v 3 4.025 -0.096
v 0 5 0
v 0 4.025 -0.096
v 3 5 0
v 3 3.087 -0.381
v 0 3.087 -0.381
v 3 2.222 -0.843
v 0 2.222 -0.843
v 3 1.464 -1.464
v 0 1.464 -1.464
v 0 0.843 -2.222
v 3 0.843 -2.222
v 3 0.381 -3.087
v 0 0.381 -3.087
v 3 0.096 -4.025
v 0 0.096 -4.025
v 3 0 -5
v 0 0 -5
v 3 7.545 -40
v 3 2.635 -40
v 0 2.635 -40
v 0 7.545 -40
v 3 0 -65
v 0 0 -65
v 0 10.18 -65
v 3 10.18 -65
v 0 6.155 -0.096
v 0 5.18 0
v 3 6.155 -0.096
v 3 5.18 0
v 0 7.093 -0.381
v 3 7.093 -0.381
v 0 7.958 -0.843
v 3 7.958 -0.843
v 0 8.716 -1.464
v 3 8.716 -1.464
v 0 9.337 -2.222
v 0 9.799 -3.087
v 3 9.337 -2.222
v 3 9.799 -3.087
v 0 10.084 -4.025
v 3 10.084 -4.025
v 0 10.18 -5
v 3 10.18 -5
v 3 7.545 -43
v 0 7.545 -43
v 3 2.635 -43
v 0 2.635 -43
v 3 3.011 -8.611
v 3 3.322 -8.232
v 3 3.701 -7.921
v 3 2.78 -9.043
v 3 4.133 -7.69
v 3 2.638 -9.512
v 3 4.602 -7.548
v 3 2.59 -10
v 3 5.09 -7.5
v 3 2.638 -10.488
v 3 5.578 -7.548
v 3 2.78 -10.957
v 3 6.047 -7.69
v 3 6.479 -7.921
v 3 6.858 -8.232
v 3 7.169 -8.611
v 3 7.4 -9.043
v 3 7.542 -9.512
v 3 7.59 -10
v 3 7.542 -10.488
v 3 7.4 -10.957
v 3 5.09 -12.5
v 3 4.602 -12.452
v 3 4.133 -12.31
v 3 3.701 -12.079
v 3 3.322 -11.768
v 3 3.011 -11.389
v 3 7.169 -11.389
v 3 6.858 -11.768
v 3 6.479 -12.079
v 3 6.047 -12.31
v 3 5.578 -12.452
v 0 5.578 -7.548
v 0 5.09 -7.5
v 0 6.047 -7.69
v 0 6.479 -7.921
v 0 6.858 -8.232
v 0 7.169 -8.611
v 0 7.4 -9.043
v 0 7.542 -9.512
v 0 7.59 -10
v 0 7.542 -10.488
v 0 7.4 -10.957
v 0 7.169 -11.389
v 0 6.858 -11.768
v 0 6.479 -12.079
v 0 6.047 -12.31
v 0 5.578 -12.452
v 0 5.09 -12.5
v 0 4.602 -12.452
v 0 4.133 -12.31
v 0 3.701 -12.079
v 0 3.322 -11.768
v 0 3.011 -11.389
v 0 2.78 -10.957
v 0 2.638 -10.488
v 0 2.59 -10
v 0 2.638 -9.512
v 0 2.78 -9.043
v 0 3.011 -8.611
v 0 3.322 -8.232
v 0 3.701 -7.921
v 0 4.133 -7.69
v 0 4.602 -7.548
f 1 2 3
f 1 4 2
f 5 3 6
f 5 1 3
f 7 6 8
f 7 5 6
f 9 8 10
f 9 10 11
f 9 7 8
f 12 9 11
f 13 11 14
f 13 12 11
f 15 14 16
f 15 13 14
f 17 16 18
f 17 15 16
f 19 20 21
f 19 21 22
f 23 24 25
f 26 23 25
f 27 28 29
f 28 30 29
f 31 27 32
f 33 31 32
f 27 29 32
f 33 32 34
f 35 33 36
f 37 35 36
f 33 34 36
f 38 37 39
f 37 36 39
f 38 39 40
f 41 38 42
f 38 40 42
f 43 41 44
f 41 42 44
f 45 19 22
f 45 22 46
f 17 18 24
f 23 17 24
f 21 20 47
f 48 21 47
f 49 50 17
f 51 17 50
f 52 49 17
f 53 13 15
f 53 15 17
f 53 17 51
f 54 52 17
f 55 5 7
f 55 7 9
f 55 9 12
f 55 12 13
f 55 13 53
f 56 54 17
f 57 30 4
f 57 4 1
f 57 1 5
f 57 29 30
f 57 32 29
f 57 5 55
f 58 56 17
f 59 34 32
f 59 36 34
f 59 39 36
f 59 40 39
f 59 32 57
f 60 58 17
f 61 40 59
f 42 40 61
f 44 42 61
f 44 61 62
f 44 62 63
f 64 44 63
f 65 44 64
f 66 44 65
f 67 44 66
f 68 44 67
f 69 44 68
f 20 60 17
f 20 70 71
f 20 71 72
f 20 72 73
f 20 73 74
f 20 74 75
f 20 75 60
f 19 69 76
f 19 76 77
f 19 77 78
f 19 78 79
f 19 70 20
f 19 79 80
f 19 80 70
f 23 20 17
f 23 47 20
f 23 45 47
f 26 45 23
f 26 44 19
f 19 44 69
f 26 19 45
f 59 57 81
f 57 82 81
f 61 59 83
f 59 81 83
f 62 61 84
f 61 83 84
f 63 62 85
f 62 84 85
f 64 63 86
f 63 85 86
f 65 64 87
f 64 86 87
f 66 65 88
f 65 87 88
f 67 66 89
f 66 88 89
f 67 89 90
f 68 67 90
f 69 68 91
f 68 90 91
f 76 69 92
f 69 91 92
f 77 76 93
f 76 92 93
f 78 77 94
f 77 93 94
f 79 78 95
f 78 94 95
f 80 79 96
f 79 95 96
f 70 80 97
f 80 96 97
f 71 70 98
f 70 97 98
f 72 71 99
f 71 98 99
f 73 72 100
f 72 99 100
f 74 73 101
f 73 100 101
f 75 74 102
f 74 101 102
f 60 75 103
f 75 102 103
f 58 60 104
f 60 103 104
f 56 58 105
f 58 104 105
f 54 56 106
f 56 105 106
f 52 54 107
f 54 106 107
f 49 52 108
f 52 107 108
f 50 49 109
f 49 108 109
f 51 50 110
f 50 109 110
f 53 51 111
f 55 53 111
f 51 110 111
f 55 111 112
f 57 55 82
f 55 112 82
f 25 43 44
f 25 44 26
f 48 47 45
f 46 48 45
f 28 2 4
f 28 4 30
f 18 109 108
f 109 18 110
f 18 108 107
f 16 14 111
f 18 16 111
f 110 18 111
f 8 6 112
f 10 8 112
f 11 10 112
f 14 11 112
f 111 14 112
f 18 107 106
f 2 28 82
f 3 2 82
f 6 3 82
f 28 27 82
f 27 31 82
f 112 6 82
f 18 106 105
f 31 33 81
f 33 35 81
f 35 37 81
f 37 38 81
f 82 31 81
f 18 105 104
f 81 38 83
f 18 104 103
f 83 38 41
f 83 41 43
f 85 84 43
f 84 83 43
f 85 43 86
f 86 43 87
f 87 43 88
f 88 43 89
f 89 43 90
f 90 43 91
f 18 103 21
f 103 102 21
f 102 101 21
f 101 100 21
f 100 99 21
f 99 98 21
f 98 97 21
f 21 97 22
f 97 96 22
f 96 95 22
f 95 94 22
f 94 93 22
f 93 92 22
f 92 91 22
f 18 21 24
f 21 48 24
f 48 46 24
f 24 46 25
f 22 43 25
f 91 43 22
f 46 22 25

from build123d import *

# Parameters (mm, degrees)
SKETCH1_W                 = 65
SKETCH1_H                 = 10.18
BOSS_EXTRUDE1_DEPTH       = 3
F_5_0MM_DOWEL_HOLE1_D     = 5
F_5_0MM_DOWEL_HOLE1_DEPTH = 3
F_5_0MM_DOWEL_HOLE1_TIP   = 1.502151548
FILLET1_R                 = 5
SKETCH4_W                 = 3
SKETCH4_H                 = 4.91
CUT_EXTRUDE1_DEPTH        = 3


with BuildPart() as part:
    # Sketch1 → Boss-Extrude1 (new body)
    with BuildSketch(Plane(origin=(0, 0, 0), x_dir=(0, 0, -1), z_dir=(1, 0, 0))):
        with Locations((32.5, 5.09)):
            Rectangle(SKETCH1_W, SKETCH1_H)
    extrude(amount=BOSS_EXTRUDE1_DEPTH)

    # Ø5.0mm Dowel Hole1
    with Locations(Plane(origin=(3, 0, 0), x_dir=(0, 0, -1), z_dir=(1, 0, 0))):
        with Locations((10, 5.09)):
            Hole(F_5_0MM_DOWEL_HOLE1_D / 2, depth=F_5_0MM_DOWEL_HOLE1_DEPTH)
            with Locations((0, 0, -(F_5_0MM_DOWEL_HOLE1_DEPTH + F_5_0MM_DOWEL_HOLE1_TIP / 2))):  # 118° drill point
                Cone(0, F_5_0MM_DOWEL_HOLE1_D / 2, F_5_0MM_DOWEL_HOLE1_TIP, mode=Mode.SUBTRACT)

    # Fillet1
    fillet1_edges = [part.edges().sort_by_distance(p)[0] for p in [
        (1.5, 10.18, 0),
        (1.5, 0, 0),
    ]]
    fillet(fillet1_edges, radius=FILLET1_R)

    # Sketch4 → Cut-Extrude1 (cut)
    with BuildSketch(Plane(origin=(3, 0, 0), x_dir=(0, 0, -1), z_dir=(1, 0, 0))):
        with Locations((41.5, 5.09)):
            Rectangle(SKETCH4_W, SKETCH4_H)
    extrude(amount=-CUT_EXTRUDE1_DEPTH, mode=Mode.SUBTRACT)


solid = part.part
